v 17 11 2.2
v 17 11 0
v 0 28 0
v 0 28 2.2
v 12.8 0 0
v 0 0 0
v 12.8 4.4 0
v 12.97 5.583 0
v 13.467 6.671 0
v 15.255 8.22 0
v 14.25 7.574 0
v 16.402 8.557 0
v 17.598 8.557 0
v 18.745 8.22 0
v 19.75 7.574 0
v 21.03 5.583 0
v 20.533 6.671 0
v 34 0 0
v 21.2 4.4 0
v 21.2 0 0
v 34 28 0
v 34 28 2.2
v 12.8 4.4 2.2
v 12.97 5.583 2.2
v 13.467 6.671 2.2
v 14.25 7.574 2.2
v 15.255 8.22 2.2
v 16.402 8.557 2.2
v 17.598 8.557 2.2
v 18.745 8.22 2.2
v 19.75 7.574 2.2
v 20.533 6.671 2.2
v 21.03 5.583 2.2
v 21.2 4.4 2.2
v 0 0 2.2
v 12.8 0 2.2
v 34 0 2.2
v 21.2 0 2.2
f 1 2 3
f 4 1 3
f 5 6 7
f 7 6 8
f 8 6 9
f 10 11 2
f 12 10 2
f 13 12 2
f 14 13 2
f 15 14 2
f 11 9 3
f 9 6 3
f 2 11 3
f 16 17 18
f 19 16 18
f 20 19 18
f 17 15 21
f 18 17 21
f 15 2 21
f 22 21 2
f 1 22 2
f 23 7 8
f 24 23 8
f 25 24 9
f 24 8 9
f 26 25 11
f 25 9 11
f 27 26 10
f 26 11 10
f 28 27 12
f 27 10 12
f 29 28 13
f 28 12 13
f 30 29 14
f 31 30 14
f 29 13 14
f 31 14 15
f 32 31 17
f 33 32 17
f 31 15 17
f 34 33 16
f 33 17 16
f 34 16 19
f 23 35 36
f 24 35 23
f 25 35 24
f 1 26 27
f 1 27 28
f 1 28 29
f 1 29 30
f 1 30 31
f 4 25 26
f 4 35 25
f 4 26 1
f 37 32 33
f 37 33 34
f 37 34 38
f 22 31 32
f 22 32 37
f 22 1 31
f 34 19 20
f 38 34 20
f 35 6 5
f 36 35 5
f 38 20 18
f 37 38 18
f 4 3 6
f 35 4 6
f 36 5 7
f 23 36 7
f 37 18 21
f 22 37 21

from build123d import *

# Parameters (mm, degrees)
BOSS_EXTRUDE1_DEPTH = 2.2


with BuildPart() as part:
    # Sketch1 → Boss-Extrude1 (new body)
    with BuildSketch(Plane.XY):
        with BuildLine():
            Line((17, 11), (0, 28))
            Line((0, 28), (0, 0))
            Line((0, 0), (12.8, 0))
            Line((12.8, 0), (12.8, 4.4))
            ThreePointArc((12.8, 4.4), (17, 8.6), (21.2, 4.4))
            Line((21.2, 4.4), (21.2, 0))
            Line((21.2, 0), (34, 0))
            Line((34, 0), (34, 28))
            Line((34, 28), (17, 11))
        make_face()
    extrude(amount=BOSS_EXTRUDE1_DEPTH)


solid = part.part
